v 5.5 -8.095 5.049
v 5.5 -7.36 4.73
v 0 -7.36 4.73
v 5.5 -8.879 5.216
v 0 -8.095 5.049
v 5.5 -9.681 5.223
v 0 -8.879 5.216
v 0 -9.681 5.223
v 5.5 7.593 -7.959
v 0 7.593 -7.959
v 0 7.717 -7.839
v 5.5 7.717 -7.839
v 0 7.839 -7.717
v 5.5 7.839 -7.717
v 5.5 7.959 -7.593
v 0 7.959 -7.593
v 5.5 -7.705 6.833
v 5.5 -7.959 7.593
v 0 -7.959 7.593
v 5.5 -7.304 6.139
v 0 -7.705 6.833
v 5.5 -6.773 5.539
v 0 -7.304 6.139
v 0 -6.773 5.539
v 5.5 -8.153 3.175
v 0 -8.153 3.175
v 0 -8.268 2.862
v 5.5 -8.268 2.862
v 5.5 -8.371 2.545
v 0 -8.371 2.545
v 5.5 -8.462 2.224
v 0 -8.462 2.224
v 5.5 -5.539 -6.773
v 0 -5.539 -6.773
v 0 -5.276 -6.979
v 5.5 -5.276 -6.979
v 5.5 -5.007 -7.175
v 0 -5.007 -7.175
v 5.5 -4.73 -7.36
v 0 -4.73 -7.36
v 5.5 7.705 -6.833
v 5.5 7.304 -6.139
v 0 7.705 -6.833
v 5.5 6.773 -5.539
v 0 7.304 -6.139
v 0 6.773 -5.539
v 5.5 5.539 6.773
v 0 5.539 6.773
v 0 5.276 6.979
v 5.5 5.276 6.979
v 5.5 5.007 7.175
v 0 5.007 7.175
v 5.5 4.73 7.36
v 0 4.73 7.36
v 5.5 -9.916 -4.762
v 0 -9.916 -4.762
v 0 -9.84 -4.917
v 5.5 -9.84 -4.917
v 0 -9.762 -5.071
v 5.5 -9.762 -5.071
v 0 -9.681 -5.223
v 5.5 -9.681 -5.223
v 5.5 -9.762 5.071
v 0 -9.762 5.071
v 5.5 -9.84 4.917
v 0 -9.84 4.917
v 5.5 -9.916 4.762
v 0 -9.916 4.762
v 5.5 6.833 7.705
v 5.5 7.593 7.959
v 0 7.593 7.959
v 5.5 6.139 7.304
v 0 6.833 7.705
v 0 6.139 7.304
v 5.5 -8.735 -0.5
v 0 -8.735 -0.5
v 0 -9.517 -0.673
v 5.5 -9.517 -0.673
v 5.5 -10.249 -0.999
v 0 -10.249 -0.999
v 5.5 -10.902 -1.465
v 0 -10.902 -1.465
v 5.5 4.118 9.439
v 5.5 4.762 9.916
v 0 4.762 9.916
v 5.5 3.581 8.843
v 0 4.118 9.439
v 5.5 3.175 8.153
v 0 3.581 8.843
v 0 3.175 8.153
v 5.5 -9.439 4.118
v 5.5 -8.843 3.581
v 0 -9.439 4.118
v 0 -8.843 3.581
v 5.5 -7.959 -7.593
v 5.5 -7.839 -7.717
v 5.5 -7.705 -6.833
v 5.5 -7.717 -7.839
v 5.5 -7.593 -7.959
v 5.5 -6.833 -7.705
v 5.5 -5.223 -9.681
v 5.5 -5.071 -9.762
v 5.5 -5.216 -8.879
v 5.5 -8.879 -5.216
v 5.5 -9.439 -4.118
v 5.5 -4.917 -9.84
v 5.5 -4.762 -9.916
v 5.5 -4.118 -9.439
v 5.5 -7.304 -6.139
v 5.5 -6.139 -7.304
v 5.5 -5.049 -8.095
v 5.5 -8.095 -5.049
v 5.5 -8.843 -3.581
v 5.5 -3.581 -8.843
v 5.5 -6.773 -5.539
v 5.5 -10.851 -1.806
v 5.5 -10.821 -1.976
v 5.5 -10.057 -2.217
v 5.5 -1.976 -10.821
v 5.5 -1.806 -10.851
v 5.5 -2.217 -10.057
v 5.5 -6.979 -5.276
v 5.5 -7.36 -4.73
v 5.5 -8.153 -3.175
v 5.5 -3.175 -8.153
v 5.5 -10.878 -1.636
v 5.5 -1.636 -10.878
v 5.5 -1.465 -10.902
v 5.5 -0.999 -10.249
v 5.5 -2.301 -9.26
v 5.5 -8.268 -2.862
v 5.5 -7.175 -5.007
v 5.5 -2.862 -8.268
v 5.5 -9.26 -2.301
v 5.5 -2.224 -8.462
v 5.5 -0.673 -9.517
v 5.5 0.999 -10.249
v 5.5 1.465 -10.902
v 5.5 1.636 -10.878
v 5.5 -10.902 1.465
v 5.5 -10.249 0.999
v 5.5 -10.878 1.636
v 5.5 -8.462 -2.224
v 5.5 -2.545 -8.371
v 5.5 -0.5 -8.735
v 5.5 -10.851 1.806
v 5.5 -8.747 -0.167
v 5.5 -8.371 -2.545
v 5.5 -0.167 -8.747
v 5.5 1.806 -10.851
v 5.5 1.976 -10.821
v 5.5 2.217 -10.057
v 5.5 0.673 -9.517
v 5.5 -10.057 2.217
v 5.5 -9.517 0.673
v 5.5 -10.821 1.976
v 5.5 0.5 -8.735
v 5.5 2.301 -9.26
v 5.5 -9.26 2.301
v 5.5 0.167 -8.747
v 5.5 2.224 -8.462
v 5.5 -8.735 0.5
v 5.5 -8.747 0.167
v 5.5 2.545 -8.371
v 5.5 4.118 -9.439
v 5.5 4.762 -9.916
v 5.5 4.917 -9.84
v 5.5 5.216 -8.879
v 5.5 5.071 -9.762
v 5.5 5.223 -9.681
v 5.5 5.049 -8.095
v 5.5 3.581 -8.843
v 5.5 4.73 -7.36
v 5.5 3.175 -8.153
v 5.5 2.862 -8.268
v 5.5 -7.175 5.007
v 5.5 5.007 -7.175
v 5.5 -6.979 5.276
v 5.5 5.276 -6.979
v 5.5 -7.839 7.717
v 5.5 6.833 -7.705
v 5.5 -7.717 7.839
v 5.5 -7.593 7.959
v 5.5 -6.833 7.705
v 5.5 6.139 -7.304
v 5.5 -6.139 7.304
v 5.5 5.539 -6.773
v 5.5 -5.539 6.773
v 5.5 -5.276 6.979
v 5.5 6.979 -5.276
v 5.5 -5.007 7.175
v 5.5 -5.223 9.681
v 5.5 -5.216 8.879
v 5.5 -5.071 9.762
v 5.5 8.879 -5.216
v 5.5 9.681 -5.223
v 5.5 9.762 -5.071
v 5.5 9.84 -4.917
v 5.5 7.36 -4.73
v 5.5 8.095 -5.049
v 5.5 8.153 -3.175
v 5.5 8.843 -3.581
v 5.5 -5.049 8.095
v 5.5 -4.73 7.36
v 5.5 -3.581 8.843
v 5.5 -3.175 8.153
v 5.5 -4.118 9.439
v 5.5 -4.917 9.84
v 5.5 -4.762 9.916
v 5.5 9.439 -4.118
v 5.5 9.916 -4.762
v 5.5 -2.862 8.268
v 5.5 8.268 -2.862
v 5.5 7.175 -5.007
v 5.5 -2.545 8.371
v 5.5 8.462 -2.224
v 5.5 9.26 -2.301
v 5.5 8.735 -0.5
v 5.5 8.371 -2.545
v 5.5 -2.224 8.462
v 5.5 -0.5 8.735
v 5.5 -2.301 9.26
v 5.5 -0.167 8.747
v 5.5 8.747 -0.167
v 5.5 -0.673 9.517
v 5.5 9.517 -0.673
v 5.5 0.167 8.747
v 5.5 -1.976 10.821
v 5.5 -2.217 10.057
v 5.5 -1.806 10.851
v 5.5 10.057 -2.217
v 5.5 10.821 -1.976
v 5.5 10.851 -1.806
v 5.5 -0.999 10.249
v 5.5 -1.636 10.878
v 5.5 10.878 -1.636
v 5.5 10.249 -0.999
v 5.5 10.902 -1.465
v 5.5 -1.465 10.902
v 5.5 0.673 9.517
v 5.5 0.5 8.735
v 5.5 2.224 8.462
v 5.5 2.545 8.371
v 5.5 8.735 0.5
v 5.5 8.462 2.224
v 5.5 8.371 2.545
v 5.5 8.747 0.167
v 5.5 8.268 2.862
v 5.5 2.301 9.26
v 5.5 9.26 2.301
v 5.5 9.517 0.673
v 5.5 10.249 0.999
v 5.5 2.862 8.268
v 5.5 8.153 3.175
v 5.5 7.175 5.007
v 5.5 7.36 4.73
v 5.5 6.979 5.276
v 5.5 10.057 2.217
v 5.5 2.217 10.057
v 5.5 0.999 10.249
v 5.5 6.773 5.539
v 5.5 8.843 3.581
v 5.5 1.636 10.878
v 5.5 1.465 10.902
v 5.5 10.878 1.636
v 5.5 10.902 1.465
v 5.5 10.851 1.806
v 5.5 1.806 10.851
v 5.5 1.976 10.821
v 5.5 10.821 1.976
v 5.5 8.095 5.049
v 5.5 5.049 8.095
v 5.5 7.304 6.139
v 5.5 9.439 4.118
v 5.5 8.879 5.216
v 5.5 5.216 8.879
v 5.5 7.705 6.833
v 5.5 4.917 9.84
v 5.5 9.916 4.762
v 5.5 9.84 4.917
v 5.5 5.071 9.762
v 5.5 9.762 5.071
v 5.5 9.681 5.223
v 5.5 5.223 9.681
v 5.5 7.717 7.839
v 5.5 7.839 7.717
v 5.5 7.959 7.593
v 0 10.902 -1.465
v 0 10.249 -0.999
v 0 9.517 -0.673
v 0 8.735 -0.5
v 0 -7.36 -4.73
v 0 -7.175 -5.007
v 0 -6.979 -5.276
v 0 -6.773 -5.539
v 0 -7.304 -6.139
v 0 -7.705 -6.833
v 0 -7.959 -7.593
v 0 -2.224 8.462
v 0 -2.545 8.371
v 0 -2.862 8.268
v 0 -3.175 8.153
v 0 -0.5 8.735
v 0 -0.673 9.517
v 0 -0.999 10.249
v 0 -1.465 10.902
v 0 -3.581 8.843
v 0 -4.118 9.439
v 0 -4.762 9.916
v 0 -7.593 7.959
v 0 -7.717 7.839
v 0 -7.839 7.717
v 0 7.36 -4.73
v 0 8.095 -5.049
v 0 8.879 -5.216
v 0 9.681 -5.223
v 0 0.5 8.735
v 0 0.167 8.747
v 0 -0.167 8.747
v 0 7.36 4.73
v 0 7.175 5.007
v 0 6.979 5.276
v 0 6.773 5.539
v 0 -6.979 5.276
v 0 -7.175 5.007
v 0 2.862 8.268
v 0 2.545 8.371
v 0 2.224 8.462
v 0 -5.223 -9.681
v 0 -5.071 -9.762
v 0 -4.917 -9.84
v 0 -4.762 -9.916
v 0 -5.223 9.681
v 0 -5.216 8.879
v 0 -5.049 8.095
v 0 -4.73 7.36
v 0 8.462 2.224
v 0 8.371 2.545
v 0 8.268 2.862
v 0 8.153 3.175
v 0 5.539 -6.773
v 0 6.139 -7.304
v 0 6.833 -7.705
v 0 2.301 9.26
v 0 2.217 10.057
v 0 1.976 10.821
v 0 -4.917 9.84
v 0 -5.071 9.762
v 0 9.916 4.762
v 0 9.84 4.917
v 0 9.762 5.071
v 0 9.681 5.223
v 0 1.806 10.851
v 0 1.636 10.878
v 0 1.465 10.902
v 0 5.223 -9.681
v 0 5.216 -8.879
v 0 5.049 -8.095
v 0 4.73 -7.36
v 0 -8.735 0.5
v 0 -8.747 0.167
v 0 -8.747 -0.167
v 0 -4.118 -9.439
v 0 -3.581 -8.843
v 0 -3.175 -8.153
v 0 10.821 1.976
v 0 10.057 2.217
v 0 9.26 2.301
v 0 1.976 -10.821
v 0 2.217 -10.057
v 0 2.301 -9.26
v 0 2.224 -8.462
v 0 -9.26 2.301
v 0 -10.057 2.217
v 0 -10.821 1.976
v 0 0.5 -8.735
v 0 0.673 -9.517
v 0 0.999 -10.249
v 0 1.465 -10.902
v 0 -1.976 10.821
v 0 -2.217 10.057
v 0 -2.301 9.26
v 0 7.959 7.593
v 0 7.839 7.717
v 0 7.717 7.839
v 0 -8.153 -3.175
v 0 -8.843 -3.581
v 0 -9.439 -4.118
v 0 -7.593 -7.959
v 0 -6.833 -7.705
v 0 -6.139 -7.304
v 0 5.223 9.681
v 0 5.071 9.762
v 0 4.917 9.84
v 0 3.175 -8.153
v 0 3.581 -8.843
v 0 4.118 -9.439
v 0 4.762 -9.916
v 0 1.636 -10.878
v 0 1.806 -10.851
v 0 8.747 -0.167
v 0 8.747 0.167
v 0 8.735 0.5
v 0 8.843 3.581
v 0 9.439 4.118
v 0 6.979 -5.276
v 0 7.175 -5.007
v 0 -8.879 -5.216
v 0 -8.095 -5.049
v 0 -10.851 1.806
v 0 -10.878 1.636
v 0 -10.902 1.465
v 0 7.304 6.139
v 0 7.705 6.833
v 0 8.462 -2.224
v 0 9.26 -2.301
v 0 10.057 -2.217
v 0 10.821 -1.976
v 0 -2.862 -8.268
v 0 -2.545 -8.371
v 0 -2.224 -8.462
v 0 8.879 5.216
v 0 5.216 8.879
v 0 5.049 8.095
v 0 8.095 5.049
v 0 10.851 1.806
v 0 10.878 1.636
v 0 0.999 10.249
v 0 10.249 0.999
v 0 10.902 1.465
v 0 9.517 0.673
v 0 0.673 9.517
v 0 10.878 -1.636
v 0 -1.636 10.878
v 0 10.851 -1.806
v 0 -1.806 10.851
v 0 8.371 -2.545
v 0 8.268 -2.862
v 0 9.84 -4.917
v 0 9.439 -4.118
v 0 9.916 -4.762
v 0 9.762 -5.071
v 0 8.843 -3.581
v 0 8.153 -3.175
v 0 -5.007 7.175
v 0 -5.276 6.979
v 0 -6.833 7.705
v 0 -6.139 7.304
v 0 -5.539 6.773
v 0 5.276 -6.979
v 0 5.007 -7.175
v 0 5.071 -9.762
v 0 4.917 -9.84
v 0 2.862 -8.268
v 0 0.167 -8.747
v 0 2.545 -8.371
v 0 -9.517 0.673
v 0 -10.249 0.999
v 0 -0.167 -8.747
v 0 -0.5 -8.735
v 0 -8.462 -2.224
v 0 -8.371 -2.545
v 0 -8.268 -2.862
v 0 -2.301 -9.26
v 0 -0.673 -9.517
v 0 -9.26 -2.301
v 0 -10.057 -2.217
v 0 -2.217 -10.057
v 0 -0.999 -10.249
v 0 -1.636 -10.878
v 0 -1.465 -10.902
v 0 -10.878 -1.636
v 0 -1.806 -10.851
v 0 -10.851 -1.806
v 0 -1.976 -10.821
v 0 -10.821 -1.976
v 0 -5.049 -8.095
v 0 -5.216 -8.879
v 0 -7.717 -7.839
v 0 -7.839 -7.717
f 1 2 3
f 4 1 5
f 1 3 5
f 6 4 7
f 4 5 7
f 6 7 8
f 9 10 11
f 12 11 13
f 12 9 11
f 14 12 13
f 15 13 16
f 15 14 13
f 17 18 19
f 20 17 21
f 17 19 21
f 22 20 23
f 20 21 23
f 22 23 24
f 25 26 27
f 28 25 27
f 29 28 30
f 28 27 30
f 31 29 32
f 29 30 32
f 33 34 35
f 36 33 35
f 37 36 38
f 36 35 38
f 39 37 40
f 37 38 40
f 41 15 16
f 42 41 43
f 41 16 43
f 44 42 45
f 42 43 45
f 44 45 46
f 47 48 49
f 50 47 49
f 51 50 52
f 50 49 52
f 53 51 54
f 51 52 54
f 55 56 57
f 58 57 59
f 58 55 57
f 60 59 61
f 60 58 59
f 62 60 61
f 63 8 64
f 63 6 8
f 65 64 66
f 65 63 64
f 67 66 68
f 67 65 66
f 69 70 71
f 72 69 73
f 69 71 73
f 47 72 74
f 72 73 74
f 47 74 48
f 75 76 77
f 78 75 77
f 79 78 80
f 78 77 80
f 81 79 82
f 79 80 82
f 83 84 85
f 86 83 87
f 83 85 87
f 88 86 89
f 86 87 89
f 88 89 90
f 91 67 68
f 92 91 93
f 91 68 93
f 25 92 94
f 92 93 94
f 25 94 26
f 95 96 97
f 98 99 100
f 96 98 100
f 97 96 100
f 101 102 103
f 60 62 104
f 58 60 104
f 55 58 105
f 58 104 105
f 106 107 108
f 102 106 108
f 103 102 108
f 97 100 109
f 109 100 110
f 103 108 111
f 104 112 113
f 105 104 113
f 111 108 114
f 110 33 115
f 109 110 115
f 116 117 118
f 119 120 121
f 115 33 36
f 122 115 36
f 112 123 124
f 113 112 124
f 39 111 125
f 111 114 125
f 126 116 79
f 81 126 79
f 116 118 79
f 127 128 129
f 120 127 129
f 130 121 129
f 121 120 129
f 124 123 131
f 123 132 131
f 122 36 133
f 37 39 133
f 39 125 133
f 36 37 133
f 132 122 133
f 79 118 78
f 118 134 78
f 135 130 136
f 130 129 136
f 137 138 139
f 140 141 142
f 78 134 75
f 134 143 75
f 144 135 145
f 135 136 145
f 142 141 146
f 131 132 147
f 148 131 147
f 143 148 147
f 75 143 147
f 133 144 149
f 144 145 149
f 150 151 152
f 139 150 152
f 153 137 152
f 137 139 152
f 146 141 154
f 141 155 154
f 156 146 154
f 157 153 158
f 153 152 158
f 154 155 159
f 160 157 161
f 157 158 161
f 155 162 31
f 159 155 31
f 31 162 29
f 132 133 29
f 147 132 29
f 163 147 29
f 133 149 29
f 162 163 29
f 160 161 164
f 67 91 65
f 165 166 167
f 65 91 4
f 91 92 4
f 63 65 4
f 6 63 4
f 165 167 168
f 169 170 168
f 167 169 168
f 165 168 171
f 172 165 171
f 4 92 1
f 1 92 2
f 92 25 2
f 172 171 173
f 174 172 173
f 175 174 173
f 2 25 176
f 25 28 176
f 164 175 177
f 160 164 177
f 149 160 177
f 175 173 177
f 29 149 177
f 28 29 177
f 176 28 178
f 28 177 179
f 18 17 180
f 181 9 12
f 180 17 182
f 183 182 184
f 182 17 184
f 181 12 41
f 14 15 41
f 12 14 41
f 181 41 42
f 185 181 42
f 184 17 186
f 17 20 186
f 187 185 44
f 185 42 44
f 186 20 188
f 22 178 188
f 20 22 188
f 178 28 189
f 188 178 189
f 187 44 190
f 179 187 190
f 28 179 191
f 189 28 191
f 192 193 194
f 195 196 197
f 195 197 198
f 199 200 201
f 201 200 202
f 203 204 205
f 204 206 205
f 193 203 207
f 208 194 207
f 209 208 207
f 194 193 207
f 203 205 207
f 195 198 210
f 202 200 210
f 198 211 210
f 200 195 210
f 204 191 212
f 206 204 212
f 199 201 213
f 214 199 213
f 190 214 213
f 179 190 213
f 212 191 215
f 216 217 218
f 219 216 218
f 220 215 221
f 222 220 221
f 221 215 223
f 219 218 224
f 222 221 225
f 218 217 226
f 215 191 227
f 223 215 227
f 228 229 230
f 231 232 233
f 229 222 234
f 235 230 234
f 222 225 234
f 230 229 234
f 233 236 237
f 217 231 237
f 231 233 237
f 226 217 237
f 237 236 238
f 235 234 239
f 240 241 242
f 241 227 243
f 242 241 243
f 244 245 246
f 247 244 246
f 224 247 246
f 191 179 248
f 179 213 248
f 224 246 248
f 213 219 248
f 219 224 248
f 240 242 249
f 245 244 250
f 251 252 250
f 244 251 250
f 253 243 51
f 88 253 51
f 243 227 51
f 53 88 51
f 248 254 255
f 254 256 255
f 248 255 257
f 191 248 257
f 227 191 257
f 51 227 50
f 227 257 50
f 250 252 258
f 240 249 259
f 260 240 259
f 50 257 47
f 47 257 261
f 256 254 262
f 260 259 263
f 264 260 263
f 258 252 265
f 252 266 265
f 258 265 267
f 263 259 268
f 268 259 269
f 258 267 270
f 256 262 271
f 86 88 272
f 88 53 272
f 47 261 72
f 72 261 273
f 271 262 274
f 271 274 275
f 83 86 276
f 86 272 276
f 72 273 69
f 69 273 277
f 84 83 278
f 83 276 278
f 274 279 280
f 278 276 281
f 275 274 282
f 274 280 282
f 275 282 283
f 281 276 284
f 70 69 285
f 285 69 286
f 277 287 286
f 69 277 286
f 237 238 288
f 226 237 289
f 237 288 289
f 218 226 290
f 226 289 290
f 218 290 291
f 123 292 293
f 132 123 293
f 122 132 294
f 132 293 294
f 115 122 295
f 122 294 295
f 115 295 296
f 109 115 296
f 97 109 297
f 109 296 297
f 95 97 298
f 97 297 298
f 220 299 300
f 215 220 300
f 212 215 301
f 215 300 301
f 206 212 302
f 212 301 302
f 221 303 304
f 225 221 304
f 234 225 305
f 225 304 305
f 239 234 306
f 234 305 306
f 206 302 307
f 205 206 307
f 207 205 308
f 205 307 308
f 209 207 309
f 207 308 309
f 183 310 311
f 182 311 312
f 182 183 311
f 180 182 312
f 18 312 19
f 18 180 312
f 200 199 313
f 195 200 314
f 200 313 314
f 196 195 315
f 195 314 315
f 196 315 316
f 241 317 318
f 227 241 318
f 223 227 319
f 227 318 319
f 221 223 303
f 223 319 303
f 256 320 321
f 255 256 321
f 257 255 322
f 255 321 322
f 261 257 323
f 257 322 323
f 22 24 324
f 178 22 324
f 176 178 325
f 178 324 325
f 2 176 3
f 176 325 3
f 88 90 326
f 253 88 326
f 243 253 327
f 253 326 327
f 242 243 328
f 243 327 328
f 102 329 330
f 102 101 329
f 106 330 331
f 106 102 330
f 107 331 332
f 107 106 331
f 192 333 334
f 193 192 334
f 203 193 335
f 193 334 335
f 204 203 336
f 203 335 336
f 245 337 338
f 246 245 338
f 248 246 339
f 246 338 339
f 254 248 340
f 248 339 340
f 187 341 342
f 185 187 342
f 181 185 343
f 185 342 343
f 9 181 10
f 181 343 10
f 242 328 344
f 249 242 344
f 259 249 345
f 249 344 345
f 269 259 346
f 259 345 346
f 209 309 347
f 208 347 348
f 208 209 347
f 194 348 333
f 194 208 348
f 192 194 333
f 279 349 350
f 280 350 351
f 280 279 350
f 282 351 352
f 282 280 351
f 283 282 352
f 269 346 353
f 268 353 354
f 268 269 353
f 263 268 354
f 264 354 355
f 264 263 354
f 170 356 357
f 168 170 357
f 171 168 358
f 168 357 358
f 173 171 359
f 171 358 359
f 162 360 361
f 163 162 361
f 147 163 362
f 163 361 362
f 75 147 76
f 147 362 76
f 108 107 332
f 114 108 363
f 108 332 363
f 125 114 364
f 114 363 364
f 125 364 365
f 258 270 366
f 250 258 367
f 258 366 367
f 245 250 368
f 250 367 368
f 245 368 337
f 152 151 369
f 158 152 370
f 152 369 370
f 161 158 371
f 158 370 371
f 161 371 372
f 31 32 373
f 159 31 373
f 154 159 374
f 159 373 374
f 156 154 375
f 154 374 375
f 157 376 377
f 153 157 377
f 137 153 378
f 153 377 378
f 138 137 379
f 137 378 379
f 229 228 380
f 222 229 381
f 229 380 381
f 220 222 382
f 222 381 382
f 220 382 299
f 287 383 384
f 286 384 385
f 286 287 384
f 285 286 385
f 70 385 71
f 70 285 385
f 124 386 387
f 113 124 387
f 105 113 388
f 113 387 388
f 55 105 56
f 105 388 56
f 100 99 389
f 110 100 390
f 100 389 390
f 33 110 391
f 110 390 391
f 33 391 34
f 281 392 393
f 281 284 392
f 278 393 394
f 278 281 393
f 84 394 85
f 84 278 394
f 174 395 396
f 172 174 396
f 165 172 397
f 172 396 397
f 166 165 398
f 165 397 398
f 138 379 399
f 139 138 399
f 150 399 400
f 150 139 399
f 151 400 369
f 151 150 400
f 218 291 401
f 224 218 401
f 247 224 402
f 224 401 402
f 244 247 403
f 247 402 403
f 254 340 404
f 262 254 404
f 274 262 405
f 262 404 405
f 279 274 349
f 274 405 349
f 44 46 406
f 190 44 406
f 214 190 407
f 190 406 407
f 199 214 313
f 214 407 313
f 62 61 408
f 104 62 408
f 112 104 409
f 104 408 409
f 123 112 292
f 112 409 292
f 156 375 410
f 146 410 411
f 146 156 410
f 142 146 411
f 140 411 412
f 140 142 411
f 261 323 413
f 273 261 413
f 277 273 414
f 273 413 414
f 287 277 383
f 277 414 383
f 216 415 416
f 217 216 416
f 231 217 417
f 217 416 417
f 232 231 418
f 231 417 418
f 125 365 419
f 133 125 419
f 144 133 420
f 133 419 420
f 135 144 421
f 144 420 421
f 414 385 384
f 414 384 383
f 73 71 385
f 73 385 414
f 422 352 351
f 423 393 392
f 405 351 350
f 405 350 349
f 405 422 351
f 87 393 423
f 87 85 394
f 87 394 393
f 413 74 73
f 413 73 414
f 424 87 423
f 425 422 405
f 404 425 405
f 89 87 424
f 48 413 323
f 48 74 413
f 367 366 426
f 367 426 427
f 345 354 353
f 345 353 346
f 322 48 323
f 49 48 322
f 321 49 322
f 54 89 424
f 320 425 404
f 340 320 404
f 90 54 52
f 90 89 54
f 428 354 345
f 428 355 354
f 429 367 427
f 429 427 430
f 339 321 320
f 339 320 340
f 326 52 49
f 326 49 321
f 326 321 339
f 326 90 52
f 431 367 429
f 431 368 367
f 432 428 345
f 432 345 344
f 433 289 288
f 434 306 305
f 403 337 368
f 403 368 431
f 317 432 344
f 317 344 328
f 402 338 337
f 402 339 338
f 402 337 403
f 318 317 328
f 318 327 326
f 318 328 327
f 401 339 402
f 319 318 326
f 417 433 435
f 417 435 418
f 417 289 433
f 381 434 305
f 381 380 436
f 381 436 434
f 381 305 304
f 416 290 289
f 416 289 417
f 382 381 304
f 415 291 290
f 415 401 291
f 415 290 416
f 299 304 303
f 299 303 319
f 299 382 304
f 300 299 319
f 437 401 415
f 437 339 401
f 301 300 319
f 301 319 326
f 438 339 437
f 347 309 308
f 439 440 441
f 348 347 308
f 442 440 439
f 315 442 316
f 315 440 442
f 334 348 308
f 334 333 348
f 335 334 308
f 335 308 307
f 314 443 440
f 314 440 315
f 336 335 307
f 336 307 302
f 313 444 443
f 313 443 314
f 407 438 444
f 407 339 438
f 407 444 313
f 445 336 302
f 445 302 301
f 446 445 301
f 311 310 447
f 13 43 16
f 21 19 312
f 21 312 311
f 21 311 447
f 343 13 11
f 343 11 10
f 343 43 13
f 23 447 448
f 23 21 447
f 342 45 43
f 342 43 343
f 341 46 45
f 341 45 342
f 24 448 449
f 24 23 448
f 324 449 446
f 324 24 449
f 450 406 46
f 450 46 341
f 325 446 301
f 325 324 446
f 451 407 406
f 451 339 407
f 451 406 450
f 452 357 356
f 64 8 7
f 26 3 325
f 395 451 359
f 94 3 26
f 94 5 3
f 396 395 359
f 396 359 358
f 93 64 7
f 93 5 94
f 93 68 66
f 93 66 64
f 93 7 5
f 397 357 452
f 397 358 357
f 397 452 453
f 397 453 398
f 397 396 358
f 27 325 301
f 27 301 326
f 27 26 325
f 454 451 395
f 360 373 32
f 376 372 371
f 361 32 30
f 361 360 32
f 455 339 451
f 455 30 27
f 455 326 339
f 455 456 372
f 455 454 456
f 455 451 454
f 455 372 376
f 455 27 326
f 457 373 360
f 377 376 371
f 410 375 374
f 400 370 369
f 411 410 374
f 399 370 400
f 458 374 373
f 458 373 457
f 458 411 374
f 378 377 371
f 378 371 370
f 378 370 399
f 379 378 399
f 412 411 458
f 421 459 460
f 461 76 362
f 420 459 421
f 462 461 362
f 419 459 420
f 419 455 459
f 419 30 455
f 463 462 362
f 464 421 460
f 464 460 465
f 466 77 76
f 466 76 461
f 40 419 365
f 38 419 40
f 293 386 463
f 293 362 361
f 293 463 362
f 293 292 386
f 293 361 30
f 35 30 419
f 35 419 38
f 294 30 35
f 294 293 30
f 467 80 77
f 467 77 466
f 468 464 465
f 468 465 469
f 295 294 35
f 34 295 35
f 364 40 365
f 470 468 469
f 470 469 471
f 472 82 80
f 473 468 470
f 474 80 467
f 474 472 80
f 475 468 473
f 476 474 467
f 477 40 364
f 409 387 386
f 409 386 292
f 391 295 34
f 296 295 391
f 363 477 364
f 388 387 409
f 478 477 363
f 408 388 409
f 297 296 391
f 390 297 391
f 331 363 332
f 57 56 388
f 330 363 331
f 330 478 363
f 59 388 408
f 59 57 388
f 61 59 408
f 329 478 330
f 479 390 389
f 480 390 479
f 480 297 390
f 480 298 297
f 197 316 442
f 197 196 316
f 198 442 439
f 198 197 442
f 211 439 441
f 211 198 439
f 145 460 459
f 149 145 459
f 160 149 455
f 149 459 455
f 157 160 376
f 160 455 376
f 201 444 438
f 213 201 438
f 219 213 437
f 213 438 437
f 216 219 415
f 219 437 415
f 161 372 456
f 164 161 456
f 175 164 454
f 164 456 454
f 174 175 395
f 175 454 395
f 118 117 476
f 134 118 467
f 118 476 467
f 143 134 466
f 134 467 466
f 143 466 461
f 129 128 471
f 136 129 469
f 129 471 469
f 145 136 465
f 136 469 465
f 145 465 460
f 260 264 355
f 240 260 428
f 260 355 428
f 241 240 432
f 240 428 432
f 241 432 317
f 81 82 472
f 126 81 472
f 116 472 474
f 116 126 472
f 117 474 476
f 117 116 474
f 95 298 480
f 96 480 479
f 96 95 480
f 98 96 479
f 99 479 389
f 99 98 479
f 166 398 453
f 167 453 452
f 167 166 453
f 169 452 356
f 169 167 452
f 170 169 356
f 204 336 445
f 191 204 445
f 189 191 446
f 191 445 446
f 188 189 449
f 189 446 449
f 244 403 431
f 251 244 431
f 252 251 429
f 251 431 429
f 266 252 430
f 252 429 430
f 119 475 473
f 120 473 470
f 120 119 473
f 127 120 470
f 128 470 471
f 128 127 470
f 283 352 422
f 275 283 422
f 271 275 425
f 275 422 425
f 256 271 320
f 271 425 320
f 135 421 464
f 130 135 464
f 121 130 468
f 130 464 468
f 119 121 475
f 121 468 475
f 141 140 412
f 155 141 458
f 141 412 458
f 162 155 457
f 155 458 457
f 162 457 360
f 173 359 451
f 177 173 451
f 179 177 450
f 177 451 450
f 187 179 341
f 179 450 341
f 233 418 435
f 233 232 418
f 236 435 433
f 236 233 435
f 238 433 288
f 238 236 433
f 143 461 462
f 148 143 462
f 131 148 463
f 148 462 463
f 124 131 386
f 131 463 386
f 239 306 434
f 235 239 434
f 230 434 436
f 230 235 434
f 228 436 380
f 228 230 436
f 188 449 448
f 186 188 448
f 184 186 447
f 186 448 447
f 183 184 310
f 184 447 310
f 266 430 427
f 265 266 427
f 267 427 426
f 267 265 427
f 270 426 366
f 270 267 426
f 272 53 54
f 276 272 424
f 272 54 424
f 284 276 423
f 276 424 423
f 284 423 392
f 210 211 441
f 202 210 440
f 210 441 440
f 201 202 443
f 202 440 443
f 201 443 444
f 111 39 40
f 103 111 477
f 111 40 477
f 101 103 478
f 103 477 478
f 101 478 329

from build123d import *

# Parameters (mm, degrees)
BASPROSKE_W     = 5.5
BASPROSKE_H     = 11
TOOTHCUT_DEPTH  = 17.5
TEETHCUTS_COUNT = 20
TEETHCUTS_ANGLE = 342
BORSKE_R        = 3
BORE_DEPTH      = 50.0000508
EXTRUDE_START   = -5.5
SKETCH_1_R      = 3
EXTRUDE_1_DEPTH = 5.5


with BuildPart() as part:
    # BasProSke → Base-Revolve (revolve)
    with BuildSketch(Plane(origin=(0, 0, 0), x_dir=(1, 0, 0), z_dir=(0, 1, 0)), mode=Mode.PRIVATE) as base_revolve_sk:
        with Locations((2.75, 5.5)):
            Rectangle(BASPROSKE_W, BASPROSKE_H)
    revolve(base_revolve_sk.sketch.rotate(Axis((-10, 0, 0), (1, 0, 0)), 180), axis=Axis((-10, 0, 0), (1, 0, 0)))

    # TooCutSke → ToothCut (cut, through all)
    with BuildSketch(Plane(origin=(0, 0, 0), x_dir=(0, 0, -1), z_dir=(1, 0, 0))):
        with BuildLine():
            ThreePointArc((0.499924007, 8.734705318), (0, 8.749), (-0.499924007, 8.734705318))
            ThreePointArc((-0.499924007, 8.734705318), (-0.824302243, 9.905497836), (-1.485192705, 10.924909509))
            ThreePointArc((-1.485192705, 10.924909509), (0, 11.0254), (1.485192705, 10.924909509))
            ThreePointArc((1.485192705, 10.924909509), (0.824302243, 9.905497836), (0.499924007, 8.734705318))
        make_face()
    toothcut = extrude(amount=TOOTHCUT_DEPTH, mode=Mode.SUBTRACT)

    # TeethCuts: ToothCut ×20 about axis
    teethcuts_axis = Axis((-10, 0, 0), (1, 0, 0))
    for i in range(1, TEETHCUTS_COUNT):
        add(toothcut.rotate(teethcuts_axis, i * TEETHCUTS_ANGLE / (TEETHCUTS_COUNT - 1)), mode=Mode.SUBTRACT)

    # BorSke → Bore (cut, symmetric)
    with BuildSketch(Plane(origin=(0, 0, 0), x_dir=(0, 0, -1), z_dir=(1, 0, 0))):
        with Locations(Location((0, 0, 0), (0, 0, 180))):
            Circle(BORSKE_R)
    extrude(amount=BORE_DEPTH, both=True, mode=Mode.SUBTRACT)

    # ｽｹｯﾁ1 → ﾎﾞｽ - 押し出し1 (add)
    with BuildSketch(Plane.ZY.offset(EXTRUDE_START)):
        Circle(SKETCH_1_R)
    extrude(amount=EXTRUDE_1_DEPTH)


solid = part.part
